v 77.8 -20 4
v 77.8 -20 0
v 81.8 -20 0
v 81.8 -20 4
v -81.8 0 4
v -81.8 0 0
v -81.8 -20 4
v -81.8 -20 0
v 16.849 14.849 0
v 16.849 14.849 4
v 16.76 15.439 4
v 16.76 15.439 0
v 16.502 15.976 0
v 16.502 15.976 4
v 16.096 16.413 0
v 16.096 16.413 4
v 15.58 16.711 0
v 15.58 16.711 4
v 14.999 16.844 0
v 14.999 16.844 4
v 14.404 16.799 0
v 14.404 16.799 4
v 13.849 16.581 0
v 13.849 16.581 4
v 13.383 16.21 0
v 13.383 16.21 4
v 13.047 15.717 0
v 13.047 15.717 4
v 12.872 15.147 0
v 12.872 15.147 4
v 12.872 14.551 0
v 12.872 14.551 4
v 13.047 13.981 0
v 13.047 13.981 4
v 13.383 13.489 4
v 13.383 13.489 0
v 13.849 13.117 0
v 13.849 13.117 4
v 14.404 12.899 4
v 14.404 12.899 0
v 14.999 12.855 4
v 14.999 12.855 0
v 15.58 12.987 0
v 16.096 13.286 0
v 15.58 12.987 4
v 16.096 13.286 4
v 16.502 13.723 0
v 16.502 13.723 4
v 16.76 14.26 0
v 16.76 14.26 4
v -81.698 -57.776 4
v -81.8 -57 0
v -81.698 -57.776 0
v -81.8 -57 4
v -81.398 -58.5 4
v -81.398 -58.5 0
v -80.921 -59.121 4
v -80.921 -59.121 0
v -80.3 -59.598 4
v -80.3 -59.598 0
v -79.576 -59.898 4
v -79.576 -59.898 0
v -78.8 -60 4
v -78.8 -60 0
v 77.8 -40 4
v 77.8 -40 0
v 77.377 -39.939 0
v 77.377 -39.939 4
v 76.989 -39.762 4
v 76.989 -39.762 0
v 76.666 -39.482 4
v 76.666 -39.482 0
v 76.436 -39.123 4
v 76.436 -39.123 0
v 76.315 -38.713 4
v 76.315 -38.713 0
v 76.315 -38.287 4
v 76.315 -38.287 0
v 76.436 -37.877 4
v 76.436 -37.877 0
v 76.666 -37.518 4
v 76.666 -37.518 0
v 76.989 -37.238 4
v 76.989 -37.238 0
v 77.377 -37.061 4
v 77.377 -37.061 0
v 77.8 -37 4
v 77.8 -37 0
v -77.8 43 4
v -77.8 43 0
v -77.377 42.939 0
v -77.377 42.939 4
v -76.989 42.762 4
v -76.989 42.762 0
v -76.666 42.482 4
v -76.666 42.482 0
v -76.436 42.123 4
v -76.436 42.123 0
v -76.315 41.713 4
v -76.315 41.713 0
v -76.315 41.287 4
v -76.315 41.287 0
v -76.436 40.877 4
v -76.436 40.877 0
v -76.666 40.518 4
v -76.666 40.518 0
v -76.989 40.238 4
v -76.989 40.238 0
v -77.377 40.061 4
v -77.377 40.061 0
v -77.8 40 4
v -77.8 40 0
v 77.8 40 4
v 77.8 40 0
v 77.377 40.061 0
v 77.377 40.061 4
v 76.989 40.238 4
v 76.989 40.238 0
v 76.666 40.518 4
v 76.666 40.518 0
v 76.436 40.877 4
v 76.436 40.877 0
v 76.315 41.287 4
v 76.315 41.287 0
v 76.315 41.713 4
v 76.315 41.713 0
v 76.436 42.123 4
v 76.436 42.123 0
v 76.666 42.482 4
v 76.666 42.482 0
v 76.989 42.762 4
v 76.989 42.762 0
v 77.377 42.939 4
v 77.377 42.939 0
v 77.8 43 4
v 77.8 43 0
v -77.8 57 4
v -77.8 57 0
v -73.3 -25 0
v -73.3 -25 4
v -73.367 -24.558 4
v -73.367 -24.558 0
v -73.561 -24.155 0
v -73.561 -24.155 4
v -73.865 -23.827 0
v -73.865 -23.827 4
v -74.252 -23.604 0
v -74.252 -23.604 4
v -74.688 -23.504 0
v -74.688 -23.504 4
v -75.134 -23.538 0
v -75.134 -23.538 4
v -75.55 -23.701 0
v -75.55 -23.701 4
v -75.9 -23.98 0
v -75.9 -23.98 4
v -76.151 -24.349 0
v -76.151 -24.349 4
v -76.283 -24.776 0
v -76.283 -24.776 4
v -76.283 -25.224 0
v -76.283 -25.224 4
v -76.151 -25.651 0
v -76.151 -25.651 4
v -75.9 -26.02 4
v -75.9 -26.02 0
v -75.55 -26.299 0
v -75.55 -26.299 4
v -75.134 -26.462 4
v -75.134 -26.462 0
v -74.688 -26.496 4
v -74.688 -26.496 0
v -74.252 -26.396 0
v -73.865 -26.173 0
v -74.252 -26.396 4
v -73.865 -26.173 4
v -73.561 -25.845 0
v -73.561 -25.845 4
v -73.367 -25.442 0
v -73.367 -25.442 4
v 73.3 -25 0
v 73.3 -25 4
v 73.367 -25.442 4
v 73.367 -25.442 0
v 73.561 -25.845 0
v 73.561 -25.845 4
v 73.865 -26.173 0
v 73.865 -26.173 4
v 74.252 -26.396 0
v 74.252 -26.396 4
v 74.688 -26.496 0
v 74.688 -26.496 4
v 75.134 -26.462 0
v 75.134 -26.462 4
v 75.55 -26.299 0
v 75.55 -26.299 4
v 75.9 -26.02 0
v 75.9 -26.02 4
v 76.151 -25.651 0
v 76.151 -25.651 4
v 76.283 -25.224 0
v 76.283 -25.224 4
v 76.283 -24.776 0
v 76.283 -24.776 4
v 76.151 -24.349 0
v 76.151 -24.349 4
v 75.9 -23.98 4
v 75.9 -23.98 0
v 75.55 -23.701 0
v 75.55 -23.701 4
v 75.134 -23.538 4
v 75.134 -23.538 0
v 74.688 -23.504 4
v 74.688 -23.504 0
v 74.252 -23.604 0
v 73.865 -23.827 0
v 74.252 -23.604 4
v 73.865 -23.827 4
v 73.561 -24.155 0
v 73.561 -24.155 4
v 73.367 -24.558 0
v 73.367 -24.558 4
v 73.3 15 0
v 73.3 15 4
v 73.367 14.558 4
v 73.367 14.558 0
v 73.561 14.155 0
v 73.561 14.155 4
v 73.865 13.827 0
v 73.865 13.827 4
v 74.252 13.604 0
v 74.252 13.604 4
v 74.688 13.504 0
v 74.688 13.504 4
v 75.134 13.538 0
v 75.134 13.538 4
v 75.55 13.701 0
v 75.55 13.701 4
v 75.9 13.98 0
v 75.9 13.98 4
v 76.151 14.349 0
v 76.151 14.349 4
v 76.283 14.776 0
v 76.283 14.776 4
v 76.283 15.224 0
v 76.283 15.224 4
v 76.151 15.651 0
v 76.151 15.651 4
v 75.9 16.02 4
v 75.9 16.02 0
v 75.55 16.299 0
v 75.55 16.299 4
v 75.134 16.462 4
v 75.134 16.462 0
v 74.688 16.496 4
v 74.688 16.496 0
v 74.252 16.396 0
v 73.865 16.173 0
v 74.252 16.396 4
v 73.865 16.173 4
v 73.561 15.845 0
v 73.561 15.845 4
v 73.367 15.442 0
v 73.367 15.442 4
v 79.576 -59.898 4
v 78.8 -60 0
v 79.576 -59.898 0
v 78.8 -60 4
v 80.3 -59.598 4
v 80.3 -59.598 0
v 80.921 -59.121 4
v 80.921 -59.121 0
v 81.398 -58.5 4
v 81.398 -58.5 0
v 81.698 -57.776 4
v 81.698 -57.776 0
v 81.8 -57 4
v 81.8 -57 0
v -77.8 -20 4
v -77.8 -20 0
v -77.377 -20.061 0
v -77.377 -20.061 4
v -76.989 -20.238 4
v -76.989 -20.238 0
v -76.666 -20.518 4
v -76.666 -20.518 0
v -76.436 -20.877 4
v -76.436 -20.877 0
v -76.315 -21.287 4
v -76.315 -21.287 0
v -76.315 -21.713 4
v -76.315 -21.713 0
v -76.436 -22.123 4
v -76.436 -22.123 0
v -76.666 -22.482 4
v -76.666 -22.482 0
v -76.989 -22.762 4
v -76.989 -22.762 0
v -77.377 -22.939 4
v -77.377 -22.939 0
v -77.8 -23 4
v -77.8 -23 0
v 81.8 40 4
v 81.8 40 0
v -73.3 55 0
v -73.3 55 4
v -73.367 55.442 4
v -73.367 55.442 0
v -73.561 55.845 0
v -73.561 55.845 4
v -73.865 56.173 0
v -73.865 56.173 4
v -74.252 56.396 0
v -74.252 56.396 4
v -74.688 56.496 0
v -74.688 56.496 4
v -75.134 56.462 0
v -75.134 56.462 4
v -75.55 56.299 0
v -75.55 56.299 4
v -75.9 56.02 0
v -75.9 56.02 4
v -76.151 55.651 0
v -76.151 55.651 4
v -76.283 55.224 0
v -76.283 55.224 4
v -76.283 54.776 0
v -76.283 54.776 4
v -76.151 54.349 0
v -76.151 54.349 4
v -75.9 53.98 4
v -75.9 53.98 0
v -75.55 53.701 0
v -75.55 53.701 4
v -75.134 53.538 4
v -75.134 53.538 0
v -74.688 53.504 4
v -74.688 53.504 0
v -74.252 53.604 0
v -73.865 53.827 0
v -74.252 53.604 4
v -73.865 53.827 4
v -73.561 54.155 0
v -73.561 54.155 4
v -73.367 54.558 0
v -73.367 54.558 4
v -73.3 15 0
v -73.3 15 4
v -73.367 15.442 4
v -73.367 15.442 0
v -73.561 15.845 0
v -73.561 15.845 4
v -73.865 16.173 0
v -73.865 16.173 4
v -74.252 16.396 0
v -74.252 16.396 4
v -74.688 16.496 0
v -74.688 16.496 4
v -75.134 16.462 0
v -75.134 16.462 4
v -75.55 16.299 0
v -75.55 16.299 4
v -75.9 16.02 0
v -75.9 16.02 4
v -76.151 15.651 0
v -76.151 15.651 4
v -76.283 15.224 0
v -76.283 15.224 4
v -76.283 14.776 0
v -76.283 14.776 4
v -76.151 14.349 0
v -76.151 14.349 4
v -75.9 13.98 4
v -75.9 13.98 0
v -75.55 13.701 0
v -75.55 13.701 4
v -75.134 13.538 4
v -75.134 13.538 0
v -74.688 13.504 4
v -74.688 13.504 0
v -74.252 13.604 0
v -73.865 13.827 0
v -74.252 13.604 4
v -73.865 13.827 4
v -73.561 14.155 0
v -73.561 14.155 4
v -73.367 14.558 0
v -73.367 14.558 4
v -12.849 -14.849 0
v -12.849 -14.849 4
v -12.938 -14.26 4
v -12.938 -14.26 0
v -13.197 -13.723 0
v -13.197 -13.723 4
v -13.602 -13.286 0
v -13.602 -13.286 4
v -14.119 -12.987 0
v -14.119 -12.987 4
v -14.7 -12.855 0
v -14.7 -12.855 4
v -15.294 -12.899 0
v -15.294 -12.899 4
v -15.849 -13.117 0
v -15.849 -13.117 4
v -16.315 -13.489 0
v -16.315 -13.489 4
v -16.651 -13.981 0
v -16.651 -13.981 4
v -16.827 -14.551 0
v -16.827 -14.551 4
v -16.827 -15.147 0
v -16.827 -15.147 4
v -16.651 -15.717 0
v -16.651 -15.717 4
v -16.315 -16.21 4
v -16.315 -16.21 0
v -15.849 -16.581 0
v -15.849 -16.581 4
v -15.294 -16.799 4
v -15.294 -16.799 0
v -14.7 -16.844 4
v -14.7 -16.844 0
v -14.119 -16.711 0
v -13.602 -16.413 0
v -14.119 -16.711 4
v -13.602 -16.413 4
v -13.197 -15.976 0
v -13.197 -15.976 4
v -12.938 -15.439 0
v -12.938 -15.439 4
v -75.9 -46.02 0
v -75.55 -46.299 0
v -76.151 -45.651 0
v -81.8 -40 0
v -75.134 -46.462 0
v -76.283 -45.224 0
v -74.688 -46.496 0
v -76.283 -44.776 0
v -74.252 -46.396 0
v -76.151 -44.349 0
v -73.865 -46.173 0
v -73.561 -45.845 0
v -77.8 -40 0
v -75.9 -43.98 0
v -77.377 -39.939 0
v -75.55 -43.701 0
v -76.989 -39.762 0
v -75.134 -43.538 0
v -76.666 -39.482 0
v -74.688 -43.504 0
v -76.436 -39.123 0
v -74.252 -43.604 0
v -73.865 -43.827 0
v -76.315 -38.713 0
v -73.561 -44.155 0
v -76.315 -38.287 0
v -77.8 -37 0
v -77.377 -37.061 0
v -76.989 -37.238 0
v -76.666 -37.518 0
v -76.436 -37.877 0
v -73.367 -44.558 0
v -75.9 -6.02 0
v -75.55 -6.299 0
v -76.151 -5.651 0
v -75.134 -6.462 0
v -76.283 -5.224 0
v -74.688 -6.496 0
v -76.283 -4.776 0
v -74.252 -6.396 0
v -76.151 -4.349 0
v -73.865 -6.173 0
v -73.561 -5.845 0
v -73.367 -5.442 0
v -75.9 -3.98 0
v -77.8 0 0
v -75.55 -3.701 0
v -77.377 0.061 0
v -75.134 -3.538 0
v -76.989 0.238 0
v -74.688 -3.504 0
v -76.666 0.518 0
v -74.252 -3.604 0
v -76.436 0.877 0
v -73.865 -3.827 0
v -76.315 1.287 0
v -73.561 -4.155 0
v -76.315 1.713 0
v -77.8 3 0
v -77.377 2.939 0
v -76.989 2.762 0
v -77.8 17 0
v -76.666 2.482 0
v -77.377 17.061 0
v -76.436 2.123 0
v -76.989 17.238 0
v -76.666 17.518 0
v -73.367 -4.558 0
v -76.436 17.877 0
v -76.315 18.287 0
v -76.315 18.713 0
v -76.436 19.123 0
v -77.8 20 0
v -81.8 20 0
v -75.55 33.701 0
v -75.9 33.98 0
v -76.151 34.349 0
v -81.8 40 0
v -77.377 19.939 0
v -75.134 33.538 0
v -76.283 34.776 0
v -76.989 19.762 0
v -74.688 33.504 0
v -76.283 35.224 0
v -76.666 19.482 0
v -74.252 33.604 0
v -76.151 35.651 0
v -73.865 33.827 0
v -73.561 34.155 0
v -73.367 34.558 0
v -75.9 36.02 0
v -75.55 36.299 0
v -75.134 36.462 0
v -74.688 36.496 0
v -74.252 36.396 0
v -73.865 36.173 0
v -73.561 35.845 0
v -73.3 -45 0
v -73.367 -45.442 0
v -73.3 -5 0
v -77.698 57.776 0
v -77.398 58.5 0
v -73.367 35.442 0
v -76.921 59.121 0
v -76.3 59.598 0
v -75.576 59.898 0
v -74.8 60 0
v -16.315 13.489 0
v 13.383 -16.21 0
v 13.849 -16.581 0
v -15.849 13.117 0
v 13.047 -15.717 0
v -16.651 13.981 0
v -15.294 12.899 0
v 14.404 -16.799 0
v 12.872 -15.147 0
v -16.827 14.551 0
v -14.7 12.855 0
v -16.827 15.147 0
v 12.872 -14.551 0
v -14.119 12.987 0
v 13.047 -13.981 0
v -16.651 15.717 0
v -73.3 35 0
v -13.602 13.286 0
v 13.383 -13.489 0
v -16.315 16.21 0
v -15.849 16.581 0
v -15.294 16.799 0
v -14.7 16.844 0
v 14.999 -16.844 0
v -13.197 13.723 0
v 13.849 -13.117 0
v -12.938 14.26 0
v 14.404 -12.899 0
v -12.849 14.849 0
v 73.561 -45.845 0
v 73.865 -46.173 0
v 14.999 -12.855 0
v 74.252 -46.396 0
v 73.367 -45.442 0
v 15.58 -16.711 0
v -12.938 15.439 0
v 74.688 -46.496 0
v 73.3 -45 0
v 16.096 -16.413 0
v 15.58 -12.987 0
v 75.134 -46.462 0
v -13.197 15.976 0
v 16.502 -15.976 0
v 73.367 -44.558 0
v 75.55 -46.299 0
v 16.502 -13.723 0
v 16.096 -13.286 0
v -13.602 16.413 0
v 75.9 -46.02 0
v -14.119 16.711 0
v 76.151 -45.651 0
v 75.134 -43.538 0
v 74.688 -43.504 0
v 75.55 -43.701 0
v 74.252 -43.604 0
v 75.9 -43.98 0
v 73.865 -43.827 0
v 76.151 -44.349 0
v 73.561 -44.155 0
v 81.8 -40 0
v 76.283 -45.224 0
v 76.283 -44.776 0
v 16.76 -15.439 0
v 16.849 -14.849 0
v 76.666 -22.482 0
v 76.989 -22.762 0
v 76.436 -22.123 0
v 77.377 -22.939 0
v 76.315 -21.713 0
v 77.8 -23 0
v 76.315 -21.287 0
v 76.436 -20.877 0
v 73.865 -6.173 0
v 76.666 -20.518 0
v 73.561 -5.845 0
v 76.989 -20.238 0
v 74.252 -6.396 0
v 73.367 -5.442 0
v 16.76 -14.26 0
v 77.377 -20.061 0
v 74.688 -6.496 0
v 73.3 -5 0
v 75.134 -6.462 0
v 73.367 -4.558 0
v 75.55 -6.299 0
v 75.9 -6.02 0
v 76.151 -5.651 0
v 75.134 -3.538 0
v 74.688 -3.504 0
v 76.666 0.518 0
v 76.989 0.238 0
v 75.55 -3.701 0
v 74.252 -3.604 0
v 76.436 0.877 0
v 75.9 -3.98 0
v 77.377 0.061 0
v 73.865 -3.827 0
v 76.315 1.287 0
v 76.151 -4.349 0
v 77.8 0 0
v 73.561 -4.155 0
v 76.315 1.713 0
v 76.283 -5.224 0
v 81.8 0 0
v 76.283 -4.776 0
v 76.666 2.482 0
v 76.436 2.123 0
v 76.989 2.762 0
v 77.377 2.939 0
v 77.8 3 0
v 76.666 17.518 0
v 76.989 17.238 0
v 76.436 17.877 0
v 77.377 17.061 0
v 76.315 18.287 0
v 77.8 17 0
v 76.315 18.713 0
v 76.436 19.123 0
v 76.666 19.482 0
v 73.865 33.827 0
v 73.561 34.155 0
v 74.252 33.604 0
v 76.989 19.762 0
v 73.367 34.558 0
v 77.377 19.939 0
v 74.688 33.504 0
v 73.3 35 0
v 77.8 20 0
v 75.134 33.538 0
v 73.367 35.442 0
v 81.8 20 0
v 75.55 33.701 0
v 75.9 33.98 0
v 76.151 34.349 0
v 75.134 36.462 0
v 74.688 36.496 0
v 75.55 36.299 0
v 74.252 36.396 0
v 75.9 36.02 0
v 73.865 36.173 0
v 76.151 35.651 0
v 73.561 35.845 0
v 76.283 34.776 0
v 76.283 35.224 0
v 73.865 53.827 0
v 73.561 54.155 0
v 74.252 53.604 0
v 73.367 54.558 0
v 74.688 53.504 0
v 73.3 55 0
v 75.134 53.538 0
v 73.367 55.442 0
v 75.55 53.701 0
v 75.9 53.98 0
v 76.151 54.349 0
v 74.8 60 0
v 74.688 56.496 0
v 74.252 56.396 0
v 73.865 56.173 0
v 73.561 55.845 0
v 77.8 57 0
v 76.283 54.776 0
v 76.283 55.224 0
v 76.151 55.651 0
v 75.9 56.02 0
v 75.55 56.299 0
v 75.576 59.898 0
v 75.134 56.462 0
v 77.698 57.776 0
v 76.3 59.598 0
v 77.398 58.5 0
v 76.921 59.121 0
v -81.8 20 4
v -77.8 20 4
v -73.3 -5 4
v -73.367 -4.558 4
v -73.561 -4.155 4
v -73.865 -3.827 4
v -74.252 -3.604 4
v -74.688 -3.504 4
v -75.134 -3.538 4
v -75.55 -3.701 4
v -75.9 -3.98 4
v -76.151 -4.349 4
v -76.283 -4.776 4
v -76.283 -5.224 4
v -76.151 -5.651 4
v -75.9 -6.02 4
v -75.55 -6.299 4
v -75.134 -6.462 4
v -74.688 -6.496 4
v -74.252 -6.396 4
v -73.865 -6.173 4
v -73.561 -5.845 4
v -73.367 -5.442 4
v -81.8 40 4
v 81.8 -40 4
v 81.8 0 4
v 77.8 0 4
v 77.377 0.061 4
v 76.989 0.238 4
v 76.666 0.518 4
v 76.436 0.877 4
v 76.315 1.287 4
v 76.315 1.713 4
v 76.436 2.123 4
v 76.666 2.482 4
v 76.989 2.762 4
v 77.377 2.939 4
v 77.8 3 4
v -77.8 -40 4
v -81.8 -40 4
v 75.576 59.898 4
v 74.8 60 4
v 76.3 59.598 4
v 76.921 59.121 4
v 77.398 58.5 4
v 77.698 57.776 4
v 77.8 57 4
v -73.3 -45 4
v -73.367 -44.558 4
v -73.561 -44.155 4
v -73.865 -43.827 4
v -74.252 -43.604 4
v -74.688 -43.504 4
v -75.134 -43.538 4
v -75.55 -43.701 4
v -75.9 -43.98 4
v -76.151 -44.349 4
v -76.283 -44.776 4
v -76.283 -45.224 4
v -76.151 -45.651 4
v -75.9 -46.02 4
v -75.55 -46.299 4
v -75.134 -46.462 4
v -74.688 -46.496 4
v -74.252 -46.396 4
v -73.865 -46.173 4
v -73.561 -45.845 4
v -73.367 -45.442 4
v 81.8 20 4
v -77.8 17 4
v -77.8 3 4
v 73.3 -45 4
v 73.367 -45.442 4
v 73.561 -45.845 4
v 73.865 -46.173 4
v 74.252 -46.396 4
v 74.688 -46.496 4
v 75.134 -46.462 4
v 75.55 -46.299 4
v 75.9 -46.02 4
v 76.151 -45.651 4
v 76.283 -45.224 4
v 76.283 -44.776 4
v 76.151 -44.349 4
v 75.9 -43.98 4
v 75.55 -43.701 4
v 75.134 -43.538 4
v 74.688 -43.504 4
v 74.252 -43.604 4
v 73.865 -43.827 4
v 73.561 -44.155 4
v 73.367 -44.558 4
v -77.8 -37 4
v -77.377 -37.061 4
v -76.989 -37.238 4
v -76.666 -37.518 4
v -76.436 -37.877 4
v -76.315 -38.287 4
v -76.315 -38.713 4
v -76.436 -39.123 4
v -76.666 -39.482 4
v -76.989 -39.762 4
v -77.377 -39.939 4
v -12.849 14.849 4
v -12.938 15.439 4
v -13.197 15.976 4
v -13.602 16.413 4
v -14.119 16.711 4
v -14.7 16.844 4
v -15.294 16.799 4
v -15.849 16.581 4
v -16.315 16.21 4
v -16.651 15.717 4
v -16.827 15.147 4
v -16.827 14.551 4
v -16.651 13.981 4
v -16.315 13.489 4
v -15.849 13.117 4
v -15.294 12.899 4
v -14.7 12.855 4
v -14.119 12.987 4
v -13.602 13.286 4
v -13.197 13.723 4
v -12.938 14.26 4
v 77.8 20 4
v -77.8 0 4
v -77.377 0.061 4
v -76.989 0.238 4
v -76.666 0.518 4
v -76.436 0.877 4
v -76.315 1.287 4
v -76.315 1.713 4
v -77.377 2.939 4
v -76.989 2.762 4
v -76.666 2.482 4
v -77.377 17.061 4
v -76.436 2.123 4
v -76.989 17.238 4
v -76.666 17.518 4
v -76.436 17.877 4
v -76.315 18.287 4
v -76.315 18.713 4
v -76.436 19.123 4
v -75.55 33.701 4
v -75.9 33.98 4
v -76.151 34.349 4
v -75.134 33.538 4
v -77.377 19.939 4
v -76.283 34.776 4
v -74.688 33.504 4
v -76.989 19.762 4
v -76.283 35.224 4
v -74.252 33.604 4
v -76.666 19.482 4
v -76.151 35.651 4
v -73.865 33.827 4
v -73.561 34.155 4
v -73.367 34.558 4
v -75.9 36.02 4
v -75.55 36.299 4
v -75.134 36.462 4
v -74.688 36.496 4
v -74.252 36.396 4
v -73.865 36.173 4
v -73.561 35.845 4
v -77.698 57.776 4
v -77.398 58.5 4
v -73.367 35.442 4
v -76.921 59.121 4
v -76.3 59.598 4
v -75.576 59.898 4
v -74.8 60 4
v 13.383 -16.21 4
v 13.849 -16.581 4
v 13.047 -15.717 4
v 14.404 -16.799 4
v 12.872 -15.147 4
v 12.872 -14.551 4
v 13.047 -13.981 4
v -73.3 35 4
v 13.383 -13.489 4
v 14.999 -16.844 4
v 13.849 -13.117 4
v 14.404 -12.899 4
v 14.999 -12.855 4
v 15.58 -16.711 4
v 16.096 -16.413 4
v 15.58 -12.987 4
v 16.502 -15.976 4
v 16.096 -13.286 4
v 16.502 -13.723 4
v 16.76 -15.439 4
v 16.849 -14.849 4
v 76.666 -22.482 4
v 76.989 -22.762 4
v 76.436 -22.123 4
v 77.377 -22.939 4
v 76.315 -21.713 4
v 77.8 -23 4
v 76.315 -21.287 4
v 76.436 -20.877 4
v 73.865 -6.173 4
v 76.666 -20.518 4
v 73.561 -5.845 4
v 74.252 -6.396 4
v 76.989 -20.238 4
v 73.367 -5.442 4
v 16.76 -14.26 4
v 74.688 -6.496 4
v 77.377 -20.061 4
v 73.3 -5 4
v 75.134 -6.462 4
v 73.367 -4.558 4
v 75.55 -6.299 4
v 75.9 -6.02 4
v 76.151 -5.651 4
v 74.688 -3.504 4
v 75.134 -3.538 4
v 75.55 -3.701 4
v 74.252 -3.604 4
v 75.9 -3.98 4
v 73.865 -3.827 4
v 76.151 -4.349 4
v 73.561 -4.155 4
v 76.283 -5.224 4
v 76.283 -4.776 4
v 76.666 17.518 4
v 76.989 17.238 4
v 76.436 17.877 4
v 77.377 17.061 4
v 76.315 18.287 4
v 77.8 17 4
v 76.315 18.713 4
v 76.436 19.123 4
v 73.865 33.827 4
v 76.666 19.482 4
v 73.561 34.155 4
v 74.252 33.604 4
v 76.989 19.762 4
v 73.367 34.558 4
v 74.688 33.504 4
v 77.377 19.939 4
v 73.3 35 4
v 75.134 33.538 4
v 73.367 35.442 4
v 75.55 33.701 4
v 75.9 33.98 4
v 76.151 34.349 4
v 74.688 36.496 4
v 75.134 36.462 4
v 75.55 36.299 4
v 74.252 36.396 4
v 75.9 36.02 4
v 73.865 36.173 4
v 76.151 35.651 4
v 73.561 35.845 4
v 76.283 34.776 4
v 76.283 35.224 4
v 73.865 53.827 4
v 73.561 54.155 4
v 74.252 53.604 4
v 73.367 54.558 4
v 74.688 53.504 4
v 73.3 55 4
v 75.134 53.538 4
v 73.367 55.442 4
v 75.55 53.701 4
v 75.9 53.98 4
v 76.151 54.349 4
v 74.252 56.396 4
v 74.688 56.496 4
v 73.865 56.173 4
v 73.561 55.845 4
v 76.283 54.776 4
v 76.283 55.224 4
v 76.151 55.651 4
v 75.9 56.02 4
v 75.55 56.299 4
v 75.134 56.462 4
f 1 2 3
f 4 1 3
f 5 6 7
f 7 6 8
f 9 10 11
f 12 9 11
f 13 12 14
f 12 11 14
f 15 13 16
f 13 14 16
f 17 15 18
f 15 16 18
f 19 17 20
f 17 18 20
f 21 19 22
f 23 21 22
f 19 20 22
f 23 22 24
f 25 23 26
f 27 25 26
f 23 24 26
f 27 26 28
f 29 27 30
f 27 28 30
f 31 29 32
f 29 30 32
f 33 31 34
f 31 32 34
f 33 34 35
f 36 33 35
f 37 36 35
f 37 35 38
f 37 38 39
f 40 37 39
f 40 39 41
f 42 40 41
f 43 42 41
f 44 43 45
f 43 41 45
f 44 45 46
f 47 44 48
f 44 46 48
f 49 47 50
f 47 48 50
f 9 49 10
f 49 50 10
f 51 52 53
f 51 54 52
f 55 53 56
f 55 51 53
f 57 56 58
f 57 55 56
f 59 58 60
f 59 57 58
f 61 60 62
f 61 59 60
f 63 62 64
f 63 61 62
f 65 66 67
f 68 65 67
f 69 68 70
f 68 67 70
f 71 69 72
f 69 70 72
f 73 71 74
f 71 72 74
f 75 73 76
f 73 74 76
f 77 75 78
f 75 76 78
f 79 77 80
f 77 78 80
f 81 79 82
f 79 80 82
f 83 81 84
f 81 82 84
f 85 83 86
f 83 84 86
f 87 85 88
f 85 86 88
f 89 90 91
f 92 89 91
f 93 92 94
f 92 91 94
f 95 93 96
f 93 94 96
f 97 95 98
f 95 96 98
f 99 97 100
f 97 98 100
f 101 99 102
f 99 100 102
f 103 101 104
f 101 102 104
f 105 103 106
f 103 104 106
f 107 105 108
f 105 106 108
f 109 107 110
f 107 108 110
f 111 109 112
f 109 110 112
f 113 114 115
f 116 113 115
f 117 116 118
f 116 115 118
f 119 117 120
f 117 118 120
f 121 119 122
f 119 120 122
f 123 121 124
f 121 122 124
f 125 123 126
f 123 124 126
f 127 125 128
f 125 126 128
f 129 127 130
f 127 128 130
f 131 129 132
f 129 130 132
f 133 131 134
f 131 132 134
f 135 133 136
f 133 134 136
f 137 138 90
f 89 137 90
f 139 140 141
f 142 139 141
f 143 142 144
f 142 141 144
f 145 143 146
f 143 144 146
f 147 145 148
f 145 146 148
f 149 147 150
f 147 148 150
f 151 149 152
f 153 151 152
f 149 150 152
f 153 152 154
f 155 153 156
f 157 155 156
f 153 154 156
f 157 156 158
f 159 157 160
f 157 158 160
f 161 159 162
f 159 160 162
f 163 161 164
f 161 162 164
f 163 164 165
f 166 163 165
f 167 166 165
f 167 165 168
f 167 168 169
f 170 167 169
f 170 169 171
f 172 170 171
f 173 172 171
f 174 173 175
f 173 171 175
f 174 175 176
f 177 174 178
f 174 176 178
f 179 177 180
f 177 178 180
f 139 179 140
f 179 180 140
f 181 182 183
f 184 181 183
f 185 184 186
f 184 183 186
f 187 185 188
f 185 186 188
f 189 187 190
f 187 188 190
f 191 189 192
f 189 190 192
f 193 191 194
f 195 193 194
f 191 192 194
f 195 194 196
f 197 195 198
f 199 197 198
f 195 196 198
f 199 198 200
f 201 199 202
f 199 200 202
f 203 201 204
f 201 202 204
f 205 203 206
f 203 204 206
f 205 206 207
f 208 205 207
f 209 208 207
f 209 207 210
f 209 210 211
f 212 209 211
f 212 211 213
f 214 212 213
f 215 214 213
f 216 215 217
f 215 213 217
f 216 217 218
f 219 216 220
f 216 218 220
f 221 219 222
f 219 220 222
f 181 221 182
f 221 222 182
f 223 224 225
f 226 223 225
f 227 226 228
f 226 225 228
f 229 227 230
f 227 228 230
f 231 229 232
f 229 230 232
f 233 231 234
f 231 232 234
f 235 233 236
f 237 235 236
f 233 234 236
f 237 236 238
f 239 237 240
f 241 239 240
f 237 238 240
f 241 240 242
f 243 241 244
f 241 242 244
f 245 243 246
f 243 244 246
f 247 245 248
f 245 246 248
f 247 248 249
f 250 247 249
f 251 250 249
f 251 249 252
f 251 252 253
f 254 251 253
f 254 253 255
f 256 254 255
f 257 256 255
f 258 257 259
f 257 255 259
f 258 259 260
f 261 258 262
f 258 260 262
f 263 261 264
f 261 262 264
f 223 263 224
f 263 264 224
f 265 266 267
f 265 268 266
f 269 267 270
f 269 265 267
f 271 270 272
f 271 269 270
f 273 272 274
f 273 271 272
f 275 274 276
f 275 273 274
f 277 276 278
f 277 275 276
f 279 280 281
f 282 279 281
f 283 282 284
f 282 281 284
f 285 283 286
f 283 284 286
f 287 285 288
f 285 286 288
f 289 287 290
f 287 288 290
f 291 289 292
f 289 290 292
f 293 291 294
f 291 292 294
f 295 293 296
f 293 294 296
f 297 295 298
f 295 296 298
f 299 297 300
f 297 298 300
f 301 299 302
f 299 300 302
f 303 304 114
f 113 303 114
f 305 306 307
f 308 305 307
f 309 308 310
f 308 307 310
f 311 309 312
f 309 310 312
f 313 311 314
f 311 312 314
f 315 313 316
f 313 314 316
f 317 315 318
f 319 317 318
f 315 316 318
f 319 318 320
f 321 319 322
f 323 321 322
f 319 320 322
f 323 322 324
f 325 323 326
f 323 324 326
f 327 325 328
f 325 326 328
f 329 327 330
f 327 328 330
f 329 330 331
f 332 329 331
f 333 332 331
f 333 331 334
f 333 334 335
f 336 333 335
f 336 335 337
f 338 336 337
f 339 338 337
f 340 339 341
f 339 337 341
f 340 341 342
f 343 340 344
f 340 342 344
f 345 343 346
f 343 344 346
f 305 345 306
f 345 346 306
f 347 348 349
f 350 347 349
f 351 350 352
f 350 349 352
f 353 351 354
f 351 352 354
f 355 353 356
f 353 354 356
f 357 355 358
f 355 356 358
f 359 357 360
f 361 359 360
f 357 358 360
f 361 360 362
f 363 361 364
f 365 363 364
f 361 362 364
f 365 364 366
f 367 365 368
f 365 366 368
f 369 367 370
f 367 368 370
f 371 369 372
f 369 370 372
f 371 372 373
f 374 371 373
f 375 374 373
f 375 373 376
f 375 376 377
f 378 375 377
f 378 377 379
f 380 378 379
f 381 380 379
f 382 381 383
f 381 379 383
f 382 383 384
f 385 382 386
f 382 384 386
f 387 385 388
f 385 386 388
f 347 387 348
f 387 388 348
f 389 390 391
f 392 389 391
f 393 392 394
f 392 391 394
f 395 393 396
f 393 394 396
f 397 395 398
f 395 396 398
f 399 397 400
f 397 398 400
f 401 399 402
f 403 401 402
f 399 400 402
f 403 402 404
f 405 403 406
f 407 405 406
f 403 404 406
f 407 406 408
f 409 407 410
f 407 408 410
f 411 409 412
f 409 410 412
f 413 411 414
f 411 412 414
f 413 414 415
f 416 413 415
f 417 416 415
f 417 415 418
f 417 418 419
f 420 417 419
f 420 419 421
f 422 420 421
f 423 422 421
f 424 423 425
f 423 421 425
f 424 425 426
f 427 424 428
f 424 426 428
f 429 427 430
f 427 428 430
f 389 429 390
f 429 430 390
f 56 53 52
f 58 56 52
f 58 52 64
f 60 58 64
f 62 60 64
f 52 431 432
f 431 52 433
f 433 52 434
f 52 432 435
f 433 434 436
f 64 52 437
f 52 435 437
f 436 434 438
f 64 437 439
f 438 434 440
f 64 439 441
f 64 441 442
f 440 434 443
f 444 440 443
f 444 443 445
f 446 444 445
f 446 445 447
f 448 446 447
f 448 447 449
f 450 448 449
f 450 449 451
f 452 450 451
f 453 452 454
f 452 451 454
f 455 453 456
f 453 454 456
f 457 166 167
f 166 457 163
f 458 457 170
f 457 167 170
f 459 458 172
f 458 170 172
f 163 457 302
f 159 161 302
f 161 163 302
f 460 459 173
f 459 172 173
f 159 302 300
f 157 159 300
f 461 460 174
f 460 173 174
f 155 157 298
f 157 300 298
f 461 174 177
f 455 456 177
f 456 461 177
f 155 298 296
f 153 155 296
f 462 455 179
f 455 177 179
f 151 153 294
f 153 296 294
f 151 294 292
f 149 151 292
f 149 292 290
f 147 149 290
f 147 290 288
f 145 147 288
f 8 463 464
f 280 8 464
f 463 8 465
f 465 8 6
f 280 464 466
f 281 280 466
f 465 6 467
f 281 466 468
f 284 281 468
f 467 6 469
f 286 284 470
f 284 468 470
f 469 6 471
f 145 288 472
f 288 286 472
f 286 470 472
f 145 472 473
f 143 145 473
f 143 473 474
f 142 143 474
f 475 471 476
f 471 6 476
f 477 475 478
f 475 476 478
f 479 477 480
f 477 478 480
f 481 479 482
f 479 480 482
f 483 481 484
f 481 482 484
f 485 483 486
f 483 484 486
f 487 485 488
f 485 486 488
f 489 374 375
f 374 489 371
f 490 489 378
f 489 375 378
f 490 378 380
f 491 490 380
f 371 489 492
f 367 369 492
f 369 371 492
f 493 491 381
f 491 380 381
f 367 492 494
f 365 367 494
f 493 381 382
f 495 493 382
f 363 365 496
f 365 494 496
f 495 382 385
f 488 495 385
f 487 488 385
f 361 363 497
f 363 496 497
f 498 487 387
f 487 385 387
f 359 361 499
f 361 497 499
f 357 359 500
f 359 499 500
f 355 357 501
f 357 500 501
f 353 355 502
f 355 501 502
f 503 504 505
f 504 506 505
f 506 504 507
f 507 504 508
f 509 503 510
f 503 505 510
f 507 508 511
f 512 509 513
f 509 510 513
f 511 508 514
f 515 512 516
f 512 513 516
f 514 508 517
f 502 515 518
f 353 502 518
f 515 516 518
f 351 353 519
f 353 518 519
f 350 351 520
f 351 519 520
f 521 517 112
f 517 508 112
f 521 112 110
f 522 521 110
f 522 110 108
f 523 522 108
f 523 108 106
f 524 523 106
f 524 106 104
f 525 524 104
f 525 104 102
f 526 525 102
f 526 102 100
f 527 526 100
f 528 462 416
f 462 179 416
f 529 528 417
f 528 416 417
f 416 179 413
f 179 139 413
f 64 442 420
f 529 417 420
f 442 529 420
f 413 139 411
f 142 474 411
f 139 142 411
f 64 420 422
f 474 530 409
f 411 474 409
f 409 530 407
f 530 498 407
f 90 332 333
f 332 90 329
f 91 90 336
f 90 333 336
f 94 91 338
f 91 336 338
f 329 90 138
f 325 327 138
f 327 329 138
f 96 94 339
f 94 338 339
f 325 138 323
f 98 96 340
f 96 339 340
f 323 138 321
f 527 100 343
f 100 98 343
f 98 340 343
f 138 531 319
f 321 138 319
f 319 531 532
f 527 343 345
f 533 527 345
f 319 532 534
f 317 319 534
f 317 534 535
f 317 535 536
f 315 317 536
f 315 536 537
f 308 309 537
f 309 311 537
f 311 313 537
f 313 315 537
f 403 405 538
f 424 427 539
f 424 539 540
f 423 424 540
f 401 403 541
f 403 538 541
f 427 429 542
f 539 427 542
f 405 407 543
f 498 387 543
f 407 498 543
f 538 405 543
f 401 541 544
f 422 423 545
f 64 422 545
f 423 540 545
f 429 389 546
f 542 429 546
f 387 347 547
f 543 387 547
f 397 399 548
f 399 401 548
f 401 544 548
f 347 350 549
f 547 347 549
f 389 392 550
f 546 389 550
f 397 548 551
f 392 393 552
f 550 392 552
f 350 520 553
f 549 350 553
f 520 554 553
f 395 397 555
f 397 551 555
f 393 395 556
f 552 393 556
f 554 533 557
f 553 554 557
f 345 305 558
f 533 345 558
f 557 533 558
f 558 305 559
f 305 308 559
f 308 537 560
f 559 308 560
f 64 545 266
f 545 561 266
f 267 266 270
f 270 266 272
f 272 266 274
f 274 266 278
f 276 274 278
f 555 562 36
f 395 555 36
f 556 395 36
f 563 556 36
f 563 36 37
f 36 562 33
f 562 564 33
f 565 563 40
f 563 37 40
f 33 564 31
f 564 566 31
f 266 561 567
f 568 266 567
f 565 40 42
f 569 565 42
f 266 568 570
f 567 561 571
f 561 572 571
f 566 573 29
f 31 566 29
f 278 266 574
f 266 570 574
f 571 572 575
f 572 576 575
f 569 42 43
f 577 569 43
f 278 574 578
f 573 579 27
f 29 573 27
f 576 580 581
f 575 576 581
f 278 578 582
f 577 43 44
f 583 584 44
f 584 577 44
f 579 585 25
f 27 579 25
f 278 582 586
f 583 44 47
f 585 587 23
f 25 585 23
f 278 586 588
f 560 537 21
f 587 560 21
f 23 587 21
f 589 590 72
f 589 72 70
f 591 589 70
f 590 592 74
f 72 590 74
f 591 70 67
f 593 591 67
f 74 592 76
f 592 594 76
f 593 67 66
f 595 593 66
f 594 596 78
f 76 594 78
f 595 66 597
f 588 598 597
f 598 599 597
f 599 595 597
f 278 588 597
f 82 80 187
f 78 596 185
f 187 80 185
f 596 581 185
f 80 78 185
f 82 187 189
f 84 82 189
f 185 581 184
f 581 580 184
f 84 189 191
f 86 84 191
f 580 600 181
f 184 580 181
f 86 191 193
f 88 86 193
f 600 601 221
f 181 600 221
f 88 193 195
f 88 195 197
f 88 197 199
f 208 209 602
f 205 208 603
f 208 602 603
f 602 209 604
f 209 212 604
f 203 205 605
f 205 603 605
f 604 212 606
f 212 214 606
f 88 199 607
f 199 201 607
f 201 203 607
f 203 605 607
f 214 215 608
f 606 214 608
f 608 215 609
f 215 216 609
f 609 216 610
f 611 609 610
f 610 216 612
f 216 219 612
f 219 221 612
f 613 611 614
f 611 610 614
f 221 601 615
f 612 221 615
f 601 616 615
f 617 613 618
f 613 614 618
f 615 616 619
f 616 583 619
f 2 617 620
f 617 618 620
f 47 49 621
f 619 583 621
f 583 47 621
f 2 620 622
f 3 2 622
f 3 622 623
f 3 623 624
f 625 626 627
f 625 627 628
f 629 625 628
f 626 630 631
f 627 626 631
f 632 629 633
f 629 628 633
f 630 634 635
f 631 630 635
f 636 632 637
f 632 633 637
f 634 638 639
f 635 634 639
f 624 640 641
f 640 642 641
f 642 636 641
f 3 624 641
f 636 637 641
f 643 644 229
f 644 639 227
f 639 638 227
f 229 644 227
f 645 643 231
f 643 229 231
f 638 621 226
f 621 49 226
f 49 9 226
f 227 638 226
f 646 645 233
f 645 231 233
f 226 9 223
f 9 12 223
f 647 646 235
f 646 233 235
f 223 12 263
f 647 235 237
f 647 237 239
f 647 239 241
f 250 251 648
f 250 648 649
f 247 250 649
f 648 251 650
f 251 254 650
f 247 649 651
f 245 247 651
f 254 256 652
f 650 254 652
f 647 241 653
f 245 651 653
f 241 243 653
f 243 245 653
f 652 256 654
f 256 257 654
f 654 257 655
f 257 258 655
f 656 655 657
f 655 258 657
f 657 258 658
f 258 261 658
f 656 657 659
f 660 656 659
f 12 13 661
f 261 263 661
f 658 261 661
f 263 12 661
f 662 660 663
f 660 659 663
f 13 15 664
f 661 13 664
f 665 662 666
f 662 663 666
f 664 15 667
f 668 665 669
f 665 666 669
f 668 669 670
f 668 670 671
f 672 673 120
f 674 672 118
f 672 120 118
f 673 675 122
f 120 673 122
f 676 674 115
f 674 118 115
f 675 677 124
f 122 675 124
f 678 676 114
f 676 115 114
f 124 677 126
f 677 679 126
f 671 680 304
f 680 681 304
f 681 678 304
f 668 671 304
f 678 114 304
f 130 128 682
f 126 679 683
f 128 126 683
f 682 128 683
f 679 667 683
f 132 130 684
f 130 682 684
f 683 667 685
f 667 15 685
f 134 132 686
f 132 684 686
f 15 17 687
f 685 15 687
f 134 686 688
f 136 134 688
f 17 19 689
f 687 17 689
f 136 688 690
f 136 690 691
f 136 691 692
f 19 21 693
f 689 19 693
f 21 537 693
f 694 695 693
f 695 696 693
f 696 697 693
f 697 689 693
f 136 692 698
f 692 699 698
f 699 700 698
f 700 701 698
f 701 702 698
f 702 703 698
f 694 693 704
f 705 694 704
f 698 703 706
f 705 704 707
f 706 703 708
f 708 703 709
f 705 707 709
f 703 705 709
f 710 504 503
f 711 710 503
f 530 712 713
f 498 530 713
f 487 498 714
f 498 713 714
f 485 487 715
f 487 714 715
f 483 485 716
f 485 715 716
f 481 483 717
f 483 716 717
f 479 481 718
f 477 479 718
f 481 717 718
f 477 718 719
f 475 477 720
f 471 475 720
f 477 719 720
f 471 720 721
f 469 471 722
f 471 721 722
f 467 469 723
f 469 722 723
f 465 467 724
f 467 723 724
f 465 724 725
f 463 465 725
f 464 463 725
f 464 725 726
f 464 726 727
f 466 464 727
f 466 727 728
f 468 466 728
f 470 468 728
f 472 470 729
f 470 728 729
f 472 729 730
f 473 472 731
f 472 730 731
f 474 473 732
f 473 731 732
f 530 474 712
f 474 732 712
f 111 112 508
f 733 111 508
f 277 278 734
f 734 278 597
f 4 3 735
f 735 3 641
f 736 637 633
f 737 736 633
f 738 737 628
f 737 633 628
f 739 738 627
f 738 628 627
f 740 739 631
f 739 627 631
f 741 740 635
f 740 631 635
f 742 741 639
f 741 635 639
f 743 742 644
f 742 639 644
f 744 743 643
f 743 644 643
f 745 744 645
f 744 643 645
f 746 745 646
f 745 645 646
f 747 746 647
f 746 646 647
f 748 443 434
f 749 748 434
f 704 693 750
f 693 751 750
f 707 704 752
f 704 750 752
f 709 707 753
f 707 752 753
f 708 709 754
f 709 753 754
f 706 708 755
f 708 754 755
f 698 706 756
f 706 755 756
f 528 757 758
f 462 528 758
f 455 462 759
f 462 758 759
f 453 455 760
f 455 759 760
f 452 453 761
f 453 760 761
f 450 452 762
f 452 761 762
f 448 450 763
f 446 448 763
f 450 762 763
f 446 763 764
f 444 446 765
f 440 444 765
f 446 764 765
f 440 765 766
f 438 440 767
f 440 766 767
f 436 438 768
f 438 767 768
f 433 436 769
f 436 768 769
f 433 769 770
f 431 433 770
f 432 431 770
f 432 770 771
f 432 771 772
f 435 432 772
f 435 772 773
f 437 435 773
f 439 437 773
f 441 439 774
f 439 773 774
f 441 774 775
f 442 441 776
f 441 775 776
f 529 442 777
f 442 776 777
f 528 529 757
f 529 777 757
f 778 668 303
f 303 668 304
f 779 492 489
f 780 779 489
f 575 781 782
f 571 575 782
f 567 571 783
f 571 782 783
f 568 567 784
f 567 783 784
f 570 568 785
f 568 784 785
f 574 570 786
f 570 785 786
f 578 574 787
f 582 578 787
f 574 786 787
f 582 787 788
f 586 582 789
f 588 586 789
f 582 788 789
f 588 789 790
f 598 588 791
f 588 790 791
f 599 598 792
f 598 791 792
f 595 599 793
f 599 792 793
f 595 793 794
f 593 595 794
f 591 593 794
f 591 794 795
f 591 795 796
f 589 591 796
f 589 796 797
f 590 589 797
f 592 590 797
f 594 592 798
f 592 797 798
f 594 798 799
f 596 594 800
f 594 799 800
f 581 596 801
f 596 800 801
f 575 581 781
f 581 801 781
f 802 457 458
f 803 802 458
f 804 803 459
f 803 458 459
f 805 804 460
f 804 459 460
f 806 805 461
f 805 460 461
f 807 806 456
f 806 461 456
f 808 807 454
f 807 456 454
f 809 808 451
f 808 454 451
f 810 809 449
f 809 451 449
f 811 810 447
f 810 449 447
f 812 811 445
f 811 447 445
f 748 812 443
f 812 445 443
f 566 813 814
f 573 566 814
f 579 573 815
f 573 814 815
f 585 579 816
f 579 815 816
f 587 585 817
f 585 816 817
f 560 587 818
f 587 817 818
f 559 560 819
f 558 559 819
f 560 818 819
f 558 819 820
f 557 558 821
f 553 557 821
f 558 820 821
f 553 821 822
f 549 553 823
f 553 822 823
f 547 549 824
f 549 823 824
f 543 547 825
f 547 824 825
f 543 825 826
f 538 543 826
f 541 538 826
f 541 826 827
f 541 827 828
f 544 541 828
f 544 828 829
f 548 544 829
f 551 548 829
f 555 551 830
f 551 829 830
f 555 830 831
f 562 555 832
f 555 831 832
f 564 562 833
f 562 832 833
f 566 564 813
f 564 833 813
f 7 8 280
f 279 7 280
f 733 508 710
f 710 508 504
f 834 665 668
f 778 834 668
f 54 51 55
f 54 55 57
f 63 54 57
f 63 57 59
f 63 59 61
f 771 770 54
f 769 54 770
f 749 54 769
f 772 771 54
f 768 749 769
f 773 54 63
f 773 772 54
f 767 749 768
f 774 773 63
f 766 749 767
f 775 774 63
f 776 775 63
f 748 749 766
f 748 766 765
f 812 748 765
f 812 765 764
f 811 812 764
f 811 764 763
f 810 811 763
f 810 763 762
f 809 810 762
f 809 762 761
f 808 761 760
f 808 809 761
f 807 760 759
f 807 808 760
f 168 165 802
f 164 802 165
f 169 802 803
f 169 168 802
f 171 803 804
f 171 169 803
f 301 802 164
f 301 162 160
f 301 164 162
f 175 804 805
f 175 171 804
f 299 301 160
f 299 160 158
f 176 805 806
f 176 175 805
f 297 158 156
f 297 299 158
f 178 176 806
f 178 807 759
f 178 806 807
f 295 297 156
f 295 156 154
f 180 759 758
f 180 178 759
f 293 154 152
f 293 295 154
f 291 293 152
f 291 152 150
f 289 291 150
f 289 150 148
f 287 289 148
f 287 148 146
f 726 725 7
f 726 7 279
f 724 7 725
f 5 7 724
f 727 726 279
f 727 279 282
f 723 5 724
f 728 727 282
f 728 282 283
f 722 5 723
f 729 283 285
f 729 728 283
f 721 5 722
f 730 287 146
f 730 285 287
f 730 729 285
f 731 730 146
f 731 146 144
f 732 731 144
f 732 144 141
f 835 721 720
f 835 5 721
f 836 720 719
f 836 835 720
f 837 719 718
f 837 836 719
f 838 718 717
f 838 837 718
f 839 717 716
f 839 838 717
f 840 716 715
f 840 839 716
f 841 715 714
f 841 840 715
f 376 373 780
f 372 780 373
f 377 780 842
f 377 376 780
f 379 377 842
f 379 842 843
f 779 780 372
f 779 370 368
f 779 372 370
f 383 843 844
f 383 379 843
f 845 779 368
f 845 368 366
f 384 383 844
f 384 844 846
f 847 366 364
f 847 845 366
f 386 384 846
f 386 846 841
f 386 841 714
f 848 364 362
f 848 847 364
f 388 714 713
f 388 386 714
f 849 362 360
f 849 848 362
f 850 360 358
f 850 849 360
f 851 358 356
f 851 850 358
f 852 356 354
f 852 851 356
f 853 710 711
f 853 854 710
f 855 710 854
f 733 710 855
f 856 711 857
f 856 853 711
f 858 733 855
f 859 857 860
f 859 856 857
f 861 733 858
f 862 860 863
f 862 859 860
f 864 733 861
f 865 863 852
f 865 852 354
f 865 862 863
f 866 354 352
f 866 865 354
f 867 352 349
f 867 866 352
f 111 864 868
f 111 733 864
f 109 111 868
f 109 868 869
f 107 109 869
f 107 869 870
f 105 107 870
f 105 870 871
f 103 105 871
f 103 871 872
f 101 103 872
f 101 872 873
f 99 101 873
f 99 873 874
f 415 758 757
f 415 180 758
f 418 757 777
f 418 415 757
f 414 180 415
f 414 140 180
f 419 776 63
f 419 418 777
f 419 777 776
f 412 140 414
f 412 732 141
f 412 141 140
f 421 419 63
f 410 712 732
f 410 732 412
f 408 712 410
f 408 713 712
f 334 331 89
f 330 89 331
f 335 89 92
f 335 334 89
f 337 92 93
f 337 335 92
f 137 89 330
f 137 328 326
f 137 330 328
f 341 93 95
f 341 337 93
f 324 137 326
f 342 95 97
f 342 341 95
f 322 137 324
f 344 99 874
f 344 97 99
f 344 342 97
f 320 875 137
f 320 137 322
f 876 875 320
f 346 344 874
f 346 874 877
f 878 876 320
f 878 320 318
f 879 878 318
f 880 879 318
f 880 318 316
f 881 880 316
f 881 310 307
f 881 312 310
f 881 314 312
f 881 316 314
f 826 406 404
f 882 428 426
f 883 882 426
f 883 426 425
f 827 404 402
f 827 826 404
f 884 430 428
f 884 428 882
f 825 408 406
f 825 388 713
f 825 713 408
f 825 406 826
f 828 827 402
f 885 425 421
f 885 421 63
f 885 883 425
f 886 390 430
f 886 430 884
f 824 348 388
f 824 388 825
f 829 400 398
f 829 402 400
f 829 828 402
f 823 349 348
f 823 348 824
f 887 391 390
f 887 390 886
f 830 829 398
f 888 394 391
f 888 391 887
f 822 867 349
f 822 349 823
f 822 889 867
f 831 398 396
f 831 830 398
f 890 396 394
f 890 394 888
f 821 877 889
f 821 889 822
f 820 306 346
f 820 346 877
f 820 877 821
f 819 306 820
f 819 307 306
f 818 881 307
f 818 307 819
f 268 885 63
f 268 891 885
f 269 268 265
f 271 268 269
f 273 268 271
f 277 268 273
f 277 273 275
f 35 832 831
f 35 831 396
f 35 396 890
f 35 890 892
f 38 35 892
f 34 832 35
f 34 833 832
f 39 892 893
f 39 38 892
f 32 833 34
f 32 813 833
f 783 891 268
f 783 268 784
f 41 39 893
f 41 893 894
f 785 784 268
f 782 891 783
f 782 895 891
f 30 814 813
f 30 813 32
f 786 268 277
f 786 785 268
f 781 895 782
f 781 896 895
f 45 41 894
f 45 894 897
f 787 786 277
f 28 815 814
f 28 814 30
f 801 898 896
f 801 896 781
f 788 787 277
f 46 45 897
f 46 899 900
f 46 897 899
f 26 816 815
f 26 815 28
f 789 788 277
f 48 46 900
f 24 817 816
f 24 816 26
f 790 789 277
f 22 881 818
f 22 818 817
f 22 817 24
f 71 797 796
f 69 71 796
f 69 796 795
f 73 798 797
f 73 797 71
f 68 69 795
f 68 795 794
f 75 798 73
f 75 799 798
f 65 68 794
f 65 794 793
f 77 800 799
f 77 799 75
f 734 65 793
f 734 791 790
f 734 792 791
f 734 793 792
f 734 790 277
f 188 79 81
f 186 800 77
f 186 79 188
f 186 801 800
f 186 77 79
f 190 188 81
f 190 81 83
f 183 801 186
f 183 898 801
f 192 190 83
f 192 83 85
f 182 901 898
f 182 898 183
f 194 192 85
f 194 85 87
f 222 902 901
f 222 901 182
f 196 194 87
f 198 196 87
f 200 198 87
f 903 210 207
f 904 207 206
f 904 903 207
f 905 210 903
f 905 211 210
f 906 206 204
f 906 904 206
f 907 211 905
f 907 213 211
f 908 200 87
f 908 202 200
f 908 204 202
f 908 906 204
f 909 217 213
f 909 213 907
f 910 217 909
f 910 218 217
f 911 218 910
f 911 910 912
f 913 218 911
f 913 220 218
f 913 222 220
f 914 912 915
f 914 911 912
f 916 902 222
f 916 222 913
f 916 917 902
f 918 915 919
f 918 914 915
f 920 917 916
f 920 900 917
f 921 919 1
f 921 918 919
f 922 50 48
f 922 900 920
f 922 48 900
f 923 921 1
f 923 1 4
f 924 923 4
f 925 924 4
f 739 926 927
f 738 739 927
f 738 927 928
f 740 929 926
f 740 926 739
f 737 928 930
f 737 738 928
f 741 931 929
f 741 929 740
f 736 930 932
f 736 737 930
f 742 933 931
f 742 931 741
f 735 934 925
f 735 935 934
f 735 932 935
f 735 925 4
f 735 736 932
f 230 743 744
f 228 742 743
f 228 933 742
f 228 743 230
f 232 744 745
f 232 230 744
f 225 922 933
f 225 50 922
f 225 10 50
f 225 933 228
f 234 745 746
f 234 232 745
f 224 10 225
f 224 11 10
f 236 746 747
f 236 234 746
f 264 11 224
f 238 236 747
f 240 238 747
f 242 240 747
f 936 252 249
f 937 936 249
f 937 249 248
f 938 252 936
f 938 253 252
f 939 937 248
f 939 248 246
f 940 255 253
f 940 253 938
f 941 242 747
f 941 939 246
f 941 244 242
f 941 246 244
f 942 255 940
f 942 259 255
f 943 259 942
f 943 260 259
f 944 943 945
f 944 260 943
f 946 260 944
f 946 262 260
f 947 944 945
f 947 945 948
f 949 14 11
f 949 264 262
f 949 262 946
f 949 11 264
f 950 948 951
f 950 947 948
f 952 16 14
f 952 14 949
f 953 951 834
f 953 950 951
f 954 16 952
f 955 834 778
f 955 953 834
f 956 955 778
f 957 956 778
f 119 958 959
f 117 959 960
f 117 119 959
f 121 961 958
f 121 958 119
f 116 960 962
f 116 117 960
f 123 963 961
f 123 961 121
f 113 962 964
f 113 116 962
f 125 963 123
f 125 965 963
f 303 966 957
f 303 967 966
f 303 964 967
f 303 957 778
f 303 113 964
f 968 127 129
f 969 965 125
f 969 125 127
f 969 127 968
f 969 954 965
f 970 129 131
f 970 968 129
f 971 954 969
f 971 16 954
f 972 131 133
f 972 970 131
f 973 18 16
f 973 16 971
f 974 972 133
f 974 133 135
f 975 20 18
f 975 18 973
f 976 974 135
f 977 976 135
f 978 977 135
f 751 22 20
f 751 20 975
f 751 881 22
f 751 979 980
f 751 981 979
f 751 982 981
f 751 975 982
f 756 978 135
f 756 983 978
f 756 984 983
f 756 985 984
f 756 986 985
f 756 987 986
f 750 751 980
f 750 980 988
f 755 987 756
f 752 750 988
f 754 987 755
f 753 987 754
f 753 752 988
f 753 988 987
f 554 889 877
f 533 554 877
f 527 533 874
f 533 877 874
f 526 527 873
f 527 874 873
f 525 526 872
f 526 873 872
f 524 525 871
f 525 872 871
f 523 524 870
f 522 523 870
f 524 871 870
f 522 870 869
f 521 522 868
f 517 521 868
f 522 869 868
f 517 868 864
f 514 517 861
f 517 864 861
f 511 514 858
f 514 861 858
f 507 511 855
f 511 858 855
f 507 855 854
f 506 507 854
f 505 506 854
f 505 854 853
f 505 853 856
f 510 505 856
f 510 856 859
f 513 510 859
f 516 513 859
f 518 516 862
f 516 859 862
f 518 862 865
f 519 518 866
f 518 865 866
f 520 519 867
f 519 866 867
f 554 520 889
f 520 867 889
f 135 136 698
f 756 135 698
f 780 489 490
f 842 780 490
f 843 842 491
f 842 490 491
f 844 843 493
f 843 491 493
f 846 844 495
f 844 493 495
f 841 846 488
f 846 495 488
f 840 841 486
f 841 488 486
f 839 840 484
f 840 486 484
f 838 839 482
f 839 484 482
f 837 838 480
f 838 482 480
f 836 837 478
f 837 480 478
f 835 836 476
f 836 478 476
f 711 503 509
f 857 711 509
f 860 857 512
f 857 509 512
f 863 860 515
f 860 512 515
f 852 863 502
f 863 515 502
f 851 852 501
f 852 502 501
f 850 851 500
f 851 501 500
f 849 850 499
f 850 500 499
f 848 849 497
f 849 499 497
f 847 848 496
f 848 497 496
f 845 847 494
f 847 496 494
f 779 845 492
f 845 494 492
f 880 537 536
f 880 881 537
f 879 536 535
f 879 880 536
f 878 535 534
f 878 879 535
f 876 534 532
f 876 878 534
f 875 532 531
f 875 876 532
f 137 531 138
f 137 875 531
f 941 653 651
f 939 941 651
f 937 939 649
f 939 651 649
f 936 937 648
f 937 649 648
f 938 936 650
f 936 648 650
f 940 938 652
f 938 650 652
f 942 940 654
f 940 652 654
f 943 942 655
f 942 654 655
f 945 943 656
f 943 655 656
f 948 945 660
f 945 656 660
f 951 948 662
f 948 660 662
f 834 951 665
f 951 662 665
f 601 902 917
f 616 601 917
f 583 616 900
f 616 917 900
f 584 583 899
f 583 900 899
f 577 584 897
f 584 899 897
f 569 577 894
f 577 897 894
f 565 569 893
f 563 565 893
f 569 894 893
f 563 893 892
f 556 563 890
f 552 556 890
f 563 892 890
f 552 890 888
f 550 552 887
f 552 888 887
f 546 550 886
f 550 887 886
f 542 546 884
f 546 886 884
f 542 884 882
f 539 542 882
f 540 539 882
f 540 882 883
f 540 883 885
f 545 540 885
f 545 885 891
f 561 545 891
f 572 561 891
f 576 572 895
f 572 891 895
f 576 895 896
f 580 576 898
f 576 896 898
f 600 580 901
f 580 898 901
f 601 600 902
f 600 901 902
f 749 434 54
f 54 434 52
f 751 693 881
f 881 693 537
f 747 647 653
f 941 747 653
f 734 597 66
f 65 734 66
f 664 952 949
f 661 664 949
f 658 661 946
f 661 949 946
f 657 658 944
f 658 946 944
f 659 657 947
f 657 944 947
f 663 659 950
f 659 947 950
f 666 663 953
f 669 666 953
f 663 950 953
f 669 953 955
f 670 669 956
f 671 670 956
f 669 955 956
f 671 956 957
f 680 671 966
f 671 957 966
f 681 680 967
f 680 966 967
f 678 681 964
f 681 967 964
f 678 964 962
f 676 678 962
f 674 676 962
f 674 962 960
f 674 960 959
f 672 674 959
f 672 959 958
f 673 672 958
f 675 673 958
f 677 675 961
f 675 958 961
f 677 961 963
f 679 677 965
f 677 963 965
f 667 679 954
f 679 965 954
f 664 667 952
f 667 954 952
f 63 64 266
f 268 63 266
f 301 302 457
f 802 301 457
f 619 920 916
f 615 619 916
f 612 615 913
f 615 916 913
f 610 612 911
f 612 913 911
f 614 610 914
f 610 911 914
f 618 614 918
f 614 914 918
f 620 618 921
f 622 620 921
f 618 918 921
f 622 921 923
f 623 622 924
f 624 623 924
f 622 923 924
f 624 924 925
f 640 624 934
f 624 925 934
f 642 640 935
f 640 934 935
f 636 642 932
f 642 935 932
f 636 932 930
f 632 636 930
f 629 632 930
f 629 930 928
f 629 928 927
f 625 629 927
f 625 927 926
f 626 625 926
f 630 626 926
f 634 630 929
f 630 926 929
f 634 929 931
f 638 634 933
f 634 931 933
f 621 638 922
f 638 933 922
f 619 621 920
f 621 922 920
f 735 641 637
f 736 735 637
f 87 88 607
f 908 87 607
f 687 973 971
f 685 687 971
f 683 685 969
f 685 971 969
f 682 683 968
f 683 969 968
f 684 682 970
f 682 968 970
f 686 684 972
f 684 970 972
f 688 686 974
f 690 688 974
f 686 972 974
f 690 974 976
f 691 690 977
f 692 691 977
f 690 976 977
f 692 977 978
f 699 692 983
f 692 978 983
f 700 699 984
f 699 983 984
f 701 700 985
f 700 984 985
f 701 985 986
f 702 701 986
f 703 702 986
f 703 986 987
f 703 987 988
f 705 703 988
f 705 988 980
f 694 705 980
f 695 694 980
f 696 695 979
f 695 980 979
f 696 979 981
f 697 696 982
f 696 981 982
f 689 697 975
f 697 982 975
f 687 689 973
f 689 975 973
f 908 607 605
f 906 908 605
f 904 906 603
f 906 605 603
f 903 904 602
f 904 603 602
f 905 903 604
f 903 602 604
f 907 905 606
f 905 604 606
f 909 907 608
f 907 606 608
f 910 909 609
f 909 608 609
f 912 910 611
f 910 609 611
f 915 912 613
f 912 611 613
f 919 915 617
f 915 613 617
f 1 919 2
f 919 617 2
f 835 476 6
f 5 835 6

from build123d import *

# Parameters (mm, degrees)
EXTRUDE_1_DEPTH     = 4
FILLET_1_R          = 3
SKETCH_2_R          = 1.5
SKETCH_2_R_2        = 2
CUT_EXTRUDE_1_DEPTH = 4


with BuildPart() as part:
    # 草图1 → 凸台-拉伸1 (new body)
    with BuildSketch(Plane.XY):
        with BuildLine():
            Line((77.8, 60), (-77.8, 60))
            Line((-77.8, 60), (-77.8, 43))
            ThreePointArc((-77.8, 43), (-76.3, 41.5), (-77.8, 40))
            Line((-77.8, 40), (-81.8, 40))
            Line((-81.8, 40), (-81.8, 20))
            Line((-81.8, 20), (-77.8, 20))
            ThreePointArc((-77.8, 20), (-76.3, 18.5), (-77.8, 17))
            Line((-77.8, 17), (-77.8, 3))
            ThreePointArc((-77.8, 3), (-76.3, 1.5), (-77.8, 0))
            Line((-77.8, 0), (-81.8, 0))
            Line((-81.8, 0), (-81.8, -20))
            Line((-81.8, -20), (-77.8, -20))
            ThreePointArc((-77.8, -20), (-76.3, -21.5), (-77.8, -23))
            Line((-77.8, -23), (-77.8, -37))
            ThreePointArc((-77.8, -37), (-76.3, -38.5), (-77.8, -40))
            Line((-77.8, -40), (-81.8, -40))
            Line((-81.8, -40), (-81.8, -60))
            Line((-81.8, -60), (81.8, -60))
            Line((81.8, -60), (81.8, -40))
            Line((81.8, -40), (77.8, -40))
            ThreePointArc((77.8, -40), (76.3, -38.5), (77.8, -37))
            Line((77.8, -37), (77.8, -23))
            ThreePointArc((77.8, -23), (76.3, -21.5), (77.8, -20))
            Line((77.8, -20), (81.8, -20))
            Line((81.8, -20), (81.8, 0))
            Line((81.8, 0), (77.8, 0))
            ThreePointArc((77.8, 0), (76.3, 1.5), (77.8, 3))
            Line((77.8, 3), (77.8, 17))
            ThreePointArc((77.8, 17), (76.3, 18.5), (77.8, 20))
            Line((77.8, 20), (81.8, 20))
            Line((81.8, 20), (81.8, 40))
            Line((81.8, 40), (77.8, 40))
            ThreePointArc((77.8, 40), (76.3, 41.5), (77.8, 43))
            Line((77.8, 43), (77.8, 60))
        make_face()
    extrude(amount=EXTRUDE_1_DEPTH)

    # 圆角1
    fillet_1_edges = [part.edges().sort_by_distance(p)[0] for p in [
        (77.8, 60, 2),
        (-77.8, 60, 2),
        (-81.8, -60, 2),
        (81.8, -60, 2),
    ]]
    fillet(fillet_1_edges, radius=FILLET_1_R)

    # 草图2 → 切除-拉伸1 (cut)
    with BuildSketch(Plane.XY.offset(4)):
        with Locations((-74.8, 55)):
            Circle(SKETCH_2_R)
        with Locations((-74.8, 35)):
            Circle(SKETCH_2_R)
        with Locations((-74.8, 15)):
            Circle(SKETCH_2_R)
        with Locations((-74.8, -5)):
            Circle(SKETCH_2_R)
        with Locations((-74.8, -25)):
            Circle(SKETCH_2_R)
        with Locations((-74.8, -45)):
            Circle(SKETCH_2_R)
        with Locations((74.8, -45)):
            Circle(SKETCH_2_R)
        with Locations((74.8, -25)):
            Circle(SKETCH_2_R)
        with Locations((74.8, -5)):
            Circle(SKETCH_2_R)
        with Locations((74.8, 15)):
            Circle(SKETCH_2_R)
        with Locations((74.8, 35)):
            Circle(SKETCH_2_R)
        with Locations((74.8, 55)):
            Circle(SKETCH_2_R)
        with Locations((-14.849242405, 14.849242405)):
            Circle(SKETCH_2_R_2)
        with Locations((14.849242405, 14.849242405)):
            Circle(SKETCH_2_R_2)
        with Locations((14.849242405, -14.849242405)):
            Circle(SKETCH_2_R_2)
        with Locations((-14.849242405, -14.849242405)):
            Circle(SKETCH_2_R_2)
    extrude(amount=-CUT_EXTRUDE_1_DEPTH, mode=Mode.SUBTRACT)


solid = part.part
